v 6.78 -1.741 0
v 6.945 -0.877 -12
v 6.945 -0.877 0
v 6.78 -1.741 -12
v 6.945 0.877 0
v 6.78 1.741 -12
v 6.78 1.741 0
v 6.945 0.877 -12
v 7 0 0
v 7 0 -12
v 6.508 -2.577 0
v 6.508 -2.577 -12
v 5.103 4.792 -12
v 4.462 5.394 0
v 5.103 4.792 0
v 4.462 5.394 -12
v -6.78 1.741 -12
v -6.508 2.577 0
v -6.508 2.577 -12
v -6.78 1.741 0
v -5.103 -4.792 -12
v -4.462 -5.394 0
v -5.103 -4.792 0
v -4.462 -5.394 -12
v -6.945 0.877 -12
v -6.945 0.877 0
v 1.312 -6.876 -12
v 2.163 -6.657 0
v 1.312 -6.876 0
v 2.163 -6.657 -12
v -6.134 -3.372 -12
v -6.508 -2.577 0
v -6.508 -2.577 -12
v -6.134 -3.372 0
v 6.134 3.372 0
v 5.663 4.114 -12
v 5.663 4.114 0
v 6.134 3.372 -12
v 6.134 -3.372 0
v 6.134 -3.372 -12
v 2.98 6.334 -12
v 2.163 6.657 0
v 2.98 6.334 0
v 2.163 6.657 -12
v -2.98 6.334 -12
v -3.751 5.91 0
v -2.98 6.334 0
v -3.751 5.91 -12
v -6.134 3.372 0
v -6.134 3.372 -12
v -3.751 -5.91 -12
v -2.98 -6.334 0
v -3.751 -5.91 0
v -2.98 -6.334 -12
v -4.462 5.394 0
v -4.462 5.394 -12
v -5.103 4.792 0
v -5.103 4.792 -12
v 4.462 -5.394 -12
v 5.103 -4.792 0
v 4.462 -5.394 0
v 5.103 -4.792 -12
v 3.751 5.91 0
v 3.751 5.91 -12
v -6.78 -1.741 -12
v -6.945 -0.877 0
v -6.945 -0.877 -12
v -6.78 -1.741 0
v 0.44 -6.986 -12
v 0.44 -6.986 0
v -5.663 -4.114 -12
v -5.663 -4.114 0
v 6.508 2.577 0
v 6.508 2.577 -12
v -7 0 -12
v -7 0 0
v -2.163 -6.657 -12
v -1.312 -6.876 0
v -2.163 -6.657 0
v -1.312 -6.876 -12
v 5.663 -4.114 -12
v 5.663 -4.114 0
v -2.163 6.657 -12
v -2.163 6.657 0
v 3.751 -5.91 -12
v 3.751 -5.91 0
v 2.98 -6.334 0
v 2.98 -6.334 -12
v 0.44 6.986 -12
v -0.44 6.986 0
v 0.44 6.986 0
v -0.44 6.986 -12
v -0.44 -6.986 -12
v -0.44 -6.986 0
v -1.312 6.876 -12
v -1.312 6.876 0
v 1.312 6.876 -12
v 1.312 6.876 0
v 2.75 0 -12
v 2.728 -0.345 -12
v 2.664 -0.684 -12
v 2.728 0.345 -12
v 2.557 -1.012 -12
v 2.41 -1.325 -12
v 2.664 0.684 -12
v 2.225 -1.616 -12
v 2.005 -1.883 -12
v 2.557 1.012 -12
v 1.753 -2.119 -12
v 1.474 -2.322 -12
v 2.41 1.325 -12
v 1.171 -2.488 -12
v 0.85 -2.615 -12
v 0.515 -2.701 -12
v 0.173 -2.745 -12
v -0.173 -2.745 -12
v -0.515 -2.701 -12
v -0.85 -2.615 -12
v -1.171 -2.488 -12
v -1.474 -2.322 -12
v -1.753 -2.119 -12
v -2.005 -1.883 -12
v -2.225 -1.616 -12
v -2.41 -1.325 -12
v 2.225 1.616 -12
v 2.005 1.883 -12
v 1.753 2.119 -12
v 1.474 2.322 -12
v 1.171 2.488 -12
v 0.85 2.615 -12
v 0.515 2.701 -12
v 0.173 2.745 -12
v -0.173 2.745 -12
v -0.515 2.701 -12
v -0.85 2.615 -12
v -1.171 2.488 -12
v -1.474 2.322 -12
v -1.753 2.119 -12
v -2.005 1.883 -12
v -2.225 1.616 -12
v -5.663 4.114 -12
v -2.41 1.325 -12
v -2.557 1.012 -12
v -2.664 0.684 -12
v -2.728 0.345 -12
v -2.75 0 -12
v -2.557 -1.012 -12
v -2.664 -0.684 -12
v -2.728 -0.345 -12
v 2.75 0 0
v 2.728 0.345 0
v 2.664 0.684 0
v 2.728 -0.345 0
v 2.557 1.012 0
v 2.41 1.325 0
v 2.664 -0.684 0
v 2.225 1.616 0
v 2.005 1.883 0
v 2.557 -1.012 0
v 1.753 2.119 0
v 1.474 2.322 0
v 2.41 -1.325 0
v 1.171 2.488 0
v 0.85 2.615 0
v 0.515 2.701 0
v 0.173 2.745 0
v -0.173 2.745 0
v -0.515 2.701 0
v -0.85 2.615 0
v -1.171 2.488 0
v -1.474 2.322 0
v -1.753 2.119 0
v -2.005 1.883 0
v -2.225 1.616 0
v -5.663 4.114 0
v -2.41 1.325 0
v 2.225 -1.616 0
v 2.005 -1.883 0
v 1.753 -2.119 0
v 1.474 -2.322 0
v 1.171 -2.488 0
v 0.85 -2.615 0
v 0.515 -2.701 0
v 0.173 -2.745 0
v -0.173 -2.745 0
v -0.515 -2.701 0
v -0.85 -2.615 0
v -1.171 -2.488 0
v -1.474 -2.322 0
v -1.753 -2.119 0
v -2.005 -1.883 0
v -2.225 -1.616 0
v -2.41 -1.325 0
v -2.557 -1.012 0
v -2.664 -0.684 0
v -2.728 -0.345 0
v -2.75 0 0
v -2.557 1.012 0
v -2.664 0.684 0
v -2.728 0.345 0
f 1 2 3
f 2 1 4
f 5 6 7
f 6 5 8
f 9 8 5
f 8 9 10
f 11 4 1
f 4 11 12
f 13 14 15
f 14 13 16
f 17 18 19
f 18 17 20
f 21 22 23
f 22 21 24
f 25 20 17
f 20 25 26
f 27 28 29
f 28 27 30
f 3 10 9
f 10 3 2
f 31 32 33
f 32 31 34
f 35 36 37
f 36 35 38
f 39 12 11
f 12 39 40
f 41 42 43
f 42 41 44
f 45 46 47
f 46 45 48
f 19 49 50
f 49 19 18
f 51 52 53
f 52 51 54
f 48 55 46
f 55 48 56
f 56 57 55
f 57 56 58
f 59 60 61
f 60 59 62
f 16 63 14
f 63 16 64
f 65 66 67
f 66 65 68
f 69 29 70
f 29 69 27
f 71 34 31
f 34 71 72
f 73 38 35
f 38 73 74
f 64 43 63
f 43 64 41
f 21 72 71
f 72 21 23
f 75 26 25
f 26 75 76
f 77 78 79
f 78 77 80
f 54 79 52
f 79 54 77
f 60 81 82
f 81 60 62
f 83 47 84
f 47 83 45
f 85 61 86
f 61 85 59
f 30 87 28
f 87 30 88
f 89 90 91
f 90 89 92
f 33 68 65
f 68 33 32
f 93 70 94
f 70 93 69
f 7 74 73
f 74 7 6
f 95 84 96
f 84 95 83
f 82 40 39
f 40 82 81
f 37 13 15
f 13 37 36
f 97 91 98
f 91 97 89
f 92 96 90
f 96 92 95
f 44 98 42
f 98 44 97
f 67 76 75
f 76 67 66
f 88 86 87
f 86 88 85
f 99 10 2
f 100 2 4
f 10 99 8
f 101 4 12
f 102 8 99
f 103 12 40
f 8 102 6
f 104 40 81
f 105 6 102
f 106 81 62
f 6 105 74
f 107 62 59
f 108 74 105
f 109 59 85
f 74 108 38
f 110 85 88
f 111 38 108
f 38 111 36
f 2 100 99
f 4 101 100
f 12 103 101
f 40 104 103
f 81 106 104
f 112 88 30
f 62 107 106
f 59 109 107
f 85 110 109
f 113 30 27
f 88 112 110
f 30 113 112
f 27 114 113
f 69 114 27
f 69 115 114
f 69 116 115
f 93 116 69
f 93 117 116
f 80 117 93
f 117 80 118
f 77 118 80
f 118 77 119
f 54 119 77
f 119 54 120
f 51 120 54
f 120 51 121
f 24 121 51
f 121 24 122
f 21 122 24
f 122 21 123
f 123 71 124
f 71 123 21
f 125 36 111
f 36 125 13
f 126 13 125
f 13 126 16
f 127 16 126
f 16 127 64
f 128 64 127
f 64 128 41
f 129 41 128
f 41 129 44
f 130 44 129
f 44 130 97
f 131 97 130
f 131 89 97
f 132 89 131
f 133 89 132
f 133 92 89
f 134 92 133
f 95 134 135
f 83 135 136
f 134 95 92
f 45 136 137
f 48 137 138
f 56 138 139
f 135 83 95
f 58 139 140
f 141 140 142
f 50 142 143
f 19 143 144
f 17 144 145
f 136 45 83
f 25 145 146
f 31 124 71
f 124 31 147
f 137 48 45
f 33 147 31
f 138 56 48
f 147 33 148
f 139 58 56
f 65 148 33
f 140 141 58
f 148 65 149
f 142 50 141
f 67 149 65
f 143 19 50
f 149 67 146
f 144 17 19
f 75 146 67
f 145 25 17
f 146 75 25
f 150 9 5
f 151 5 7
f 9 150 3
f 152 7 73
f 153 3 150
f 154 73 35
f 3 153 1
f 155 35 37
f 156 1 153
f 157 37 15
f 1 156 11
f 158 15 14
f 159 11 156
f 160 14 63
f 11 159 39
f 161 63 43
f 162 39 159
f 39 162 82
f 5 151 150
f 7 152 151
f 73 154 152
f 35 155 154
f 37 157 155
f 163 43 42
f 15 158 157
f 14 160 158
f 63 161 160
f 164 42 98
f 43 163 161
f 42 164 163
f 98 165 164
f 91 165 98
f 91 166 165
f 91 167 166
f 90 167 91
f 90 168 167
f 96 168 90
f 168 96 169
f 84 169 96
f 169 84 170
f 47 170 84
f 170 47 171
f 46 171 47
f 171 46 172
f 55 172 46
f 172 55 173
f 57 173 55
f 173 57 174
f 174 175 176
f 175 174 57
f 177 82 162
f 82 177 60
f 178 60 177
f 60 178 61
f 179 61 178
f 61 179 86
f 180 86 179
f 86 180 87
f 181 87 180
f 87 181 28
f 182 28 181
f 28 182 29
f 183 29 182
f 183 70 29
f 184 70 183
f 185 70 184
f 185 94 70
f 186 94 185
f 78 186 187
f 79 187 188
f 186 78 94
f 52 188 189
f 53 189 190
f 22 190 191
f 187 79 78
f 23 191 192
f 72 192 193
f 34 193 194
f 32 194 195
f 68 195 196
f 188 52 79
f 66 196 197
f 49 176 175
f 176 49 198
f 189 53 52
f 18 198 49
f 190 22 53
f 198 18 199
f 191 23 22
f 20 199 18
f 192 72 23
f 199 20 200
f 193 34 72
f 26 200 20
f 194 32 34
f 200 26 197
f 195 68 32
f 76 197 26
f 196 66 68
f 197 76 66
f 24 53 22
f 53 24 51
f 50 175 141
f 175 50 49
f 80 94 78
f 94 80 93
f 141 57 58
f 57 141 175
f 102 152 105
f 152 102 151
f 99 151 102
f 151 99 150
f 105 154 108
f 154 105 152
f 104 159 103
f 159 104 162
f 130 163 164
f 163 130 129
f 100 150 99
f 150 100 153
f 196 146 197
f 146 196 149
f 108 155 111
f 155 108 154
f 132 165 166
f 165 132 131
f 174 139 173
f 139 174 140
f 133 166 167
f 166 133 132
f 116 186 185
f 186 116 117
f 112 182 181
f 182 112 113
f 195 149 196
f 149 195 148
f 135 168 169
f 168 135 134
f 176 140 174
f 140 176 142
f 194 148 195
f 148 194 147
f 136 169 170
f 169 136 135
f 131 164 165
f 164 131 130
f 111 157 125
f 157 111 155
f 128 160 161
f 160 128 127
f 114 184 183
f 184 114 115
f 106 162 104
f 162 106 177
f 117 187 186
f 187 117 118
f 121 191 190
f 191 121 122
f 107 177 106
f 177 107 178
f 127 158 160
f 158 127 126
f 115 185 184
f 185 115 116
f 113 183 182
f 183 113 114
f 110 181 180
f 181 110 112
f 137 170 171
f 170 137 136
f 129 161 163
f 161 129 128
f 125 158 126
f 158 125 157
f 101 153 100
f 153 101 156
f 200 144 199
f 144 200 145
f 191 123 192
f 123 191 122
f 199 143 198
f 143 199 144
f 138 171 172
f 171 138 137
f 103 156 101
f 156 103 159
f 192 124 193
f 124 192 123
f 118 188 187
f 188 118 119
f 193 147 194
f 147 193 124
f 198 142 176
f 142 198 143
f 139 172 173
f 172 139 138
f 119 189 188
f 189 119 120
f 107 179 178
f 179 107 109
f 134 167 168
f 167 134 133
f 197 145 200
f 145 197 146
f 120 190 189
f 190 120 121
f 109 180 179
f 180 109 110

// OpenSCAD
$fn = 50;


difference() {
	union() {
		translate(v = [0, 0, -12.0000000000]) {
			cylinder(h = 12, r = 7.0000000000);
		}
		cylinder(h = 0, r = 10.0000000000);
	}
	union() {
		#translate(v = [0, 0, -12]) {
			cylinder(h = 12, r = 2.7500000000);
		}
	}
}
